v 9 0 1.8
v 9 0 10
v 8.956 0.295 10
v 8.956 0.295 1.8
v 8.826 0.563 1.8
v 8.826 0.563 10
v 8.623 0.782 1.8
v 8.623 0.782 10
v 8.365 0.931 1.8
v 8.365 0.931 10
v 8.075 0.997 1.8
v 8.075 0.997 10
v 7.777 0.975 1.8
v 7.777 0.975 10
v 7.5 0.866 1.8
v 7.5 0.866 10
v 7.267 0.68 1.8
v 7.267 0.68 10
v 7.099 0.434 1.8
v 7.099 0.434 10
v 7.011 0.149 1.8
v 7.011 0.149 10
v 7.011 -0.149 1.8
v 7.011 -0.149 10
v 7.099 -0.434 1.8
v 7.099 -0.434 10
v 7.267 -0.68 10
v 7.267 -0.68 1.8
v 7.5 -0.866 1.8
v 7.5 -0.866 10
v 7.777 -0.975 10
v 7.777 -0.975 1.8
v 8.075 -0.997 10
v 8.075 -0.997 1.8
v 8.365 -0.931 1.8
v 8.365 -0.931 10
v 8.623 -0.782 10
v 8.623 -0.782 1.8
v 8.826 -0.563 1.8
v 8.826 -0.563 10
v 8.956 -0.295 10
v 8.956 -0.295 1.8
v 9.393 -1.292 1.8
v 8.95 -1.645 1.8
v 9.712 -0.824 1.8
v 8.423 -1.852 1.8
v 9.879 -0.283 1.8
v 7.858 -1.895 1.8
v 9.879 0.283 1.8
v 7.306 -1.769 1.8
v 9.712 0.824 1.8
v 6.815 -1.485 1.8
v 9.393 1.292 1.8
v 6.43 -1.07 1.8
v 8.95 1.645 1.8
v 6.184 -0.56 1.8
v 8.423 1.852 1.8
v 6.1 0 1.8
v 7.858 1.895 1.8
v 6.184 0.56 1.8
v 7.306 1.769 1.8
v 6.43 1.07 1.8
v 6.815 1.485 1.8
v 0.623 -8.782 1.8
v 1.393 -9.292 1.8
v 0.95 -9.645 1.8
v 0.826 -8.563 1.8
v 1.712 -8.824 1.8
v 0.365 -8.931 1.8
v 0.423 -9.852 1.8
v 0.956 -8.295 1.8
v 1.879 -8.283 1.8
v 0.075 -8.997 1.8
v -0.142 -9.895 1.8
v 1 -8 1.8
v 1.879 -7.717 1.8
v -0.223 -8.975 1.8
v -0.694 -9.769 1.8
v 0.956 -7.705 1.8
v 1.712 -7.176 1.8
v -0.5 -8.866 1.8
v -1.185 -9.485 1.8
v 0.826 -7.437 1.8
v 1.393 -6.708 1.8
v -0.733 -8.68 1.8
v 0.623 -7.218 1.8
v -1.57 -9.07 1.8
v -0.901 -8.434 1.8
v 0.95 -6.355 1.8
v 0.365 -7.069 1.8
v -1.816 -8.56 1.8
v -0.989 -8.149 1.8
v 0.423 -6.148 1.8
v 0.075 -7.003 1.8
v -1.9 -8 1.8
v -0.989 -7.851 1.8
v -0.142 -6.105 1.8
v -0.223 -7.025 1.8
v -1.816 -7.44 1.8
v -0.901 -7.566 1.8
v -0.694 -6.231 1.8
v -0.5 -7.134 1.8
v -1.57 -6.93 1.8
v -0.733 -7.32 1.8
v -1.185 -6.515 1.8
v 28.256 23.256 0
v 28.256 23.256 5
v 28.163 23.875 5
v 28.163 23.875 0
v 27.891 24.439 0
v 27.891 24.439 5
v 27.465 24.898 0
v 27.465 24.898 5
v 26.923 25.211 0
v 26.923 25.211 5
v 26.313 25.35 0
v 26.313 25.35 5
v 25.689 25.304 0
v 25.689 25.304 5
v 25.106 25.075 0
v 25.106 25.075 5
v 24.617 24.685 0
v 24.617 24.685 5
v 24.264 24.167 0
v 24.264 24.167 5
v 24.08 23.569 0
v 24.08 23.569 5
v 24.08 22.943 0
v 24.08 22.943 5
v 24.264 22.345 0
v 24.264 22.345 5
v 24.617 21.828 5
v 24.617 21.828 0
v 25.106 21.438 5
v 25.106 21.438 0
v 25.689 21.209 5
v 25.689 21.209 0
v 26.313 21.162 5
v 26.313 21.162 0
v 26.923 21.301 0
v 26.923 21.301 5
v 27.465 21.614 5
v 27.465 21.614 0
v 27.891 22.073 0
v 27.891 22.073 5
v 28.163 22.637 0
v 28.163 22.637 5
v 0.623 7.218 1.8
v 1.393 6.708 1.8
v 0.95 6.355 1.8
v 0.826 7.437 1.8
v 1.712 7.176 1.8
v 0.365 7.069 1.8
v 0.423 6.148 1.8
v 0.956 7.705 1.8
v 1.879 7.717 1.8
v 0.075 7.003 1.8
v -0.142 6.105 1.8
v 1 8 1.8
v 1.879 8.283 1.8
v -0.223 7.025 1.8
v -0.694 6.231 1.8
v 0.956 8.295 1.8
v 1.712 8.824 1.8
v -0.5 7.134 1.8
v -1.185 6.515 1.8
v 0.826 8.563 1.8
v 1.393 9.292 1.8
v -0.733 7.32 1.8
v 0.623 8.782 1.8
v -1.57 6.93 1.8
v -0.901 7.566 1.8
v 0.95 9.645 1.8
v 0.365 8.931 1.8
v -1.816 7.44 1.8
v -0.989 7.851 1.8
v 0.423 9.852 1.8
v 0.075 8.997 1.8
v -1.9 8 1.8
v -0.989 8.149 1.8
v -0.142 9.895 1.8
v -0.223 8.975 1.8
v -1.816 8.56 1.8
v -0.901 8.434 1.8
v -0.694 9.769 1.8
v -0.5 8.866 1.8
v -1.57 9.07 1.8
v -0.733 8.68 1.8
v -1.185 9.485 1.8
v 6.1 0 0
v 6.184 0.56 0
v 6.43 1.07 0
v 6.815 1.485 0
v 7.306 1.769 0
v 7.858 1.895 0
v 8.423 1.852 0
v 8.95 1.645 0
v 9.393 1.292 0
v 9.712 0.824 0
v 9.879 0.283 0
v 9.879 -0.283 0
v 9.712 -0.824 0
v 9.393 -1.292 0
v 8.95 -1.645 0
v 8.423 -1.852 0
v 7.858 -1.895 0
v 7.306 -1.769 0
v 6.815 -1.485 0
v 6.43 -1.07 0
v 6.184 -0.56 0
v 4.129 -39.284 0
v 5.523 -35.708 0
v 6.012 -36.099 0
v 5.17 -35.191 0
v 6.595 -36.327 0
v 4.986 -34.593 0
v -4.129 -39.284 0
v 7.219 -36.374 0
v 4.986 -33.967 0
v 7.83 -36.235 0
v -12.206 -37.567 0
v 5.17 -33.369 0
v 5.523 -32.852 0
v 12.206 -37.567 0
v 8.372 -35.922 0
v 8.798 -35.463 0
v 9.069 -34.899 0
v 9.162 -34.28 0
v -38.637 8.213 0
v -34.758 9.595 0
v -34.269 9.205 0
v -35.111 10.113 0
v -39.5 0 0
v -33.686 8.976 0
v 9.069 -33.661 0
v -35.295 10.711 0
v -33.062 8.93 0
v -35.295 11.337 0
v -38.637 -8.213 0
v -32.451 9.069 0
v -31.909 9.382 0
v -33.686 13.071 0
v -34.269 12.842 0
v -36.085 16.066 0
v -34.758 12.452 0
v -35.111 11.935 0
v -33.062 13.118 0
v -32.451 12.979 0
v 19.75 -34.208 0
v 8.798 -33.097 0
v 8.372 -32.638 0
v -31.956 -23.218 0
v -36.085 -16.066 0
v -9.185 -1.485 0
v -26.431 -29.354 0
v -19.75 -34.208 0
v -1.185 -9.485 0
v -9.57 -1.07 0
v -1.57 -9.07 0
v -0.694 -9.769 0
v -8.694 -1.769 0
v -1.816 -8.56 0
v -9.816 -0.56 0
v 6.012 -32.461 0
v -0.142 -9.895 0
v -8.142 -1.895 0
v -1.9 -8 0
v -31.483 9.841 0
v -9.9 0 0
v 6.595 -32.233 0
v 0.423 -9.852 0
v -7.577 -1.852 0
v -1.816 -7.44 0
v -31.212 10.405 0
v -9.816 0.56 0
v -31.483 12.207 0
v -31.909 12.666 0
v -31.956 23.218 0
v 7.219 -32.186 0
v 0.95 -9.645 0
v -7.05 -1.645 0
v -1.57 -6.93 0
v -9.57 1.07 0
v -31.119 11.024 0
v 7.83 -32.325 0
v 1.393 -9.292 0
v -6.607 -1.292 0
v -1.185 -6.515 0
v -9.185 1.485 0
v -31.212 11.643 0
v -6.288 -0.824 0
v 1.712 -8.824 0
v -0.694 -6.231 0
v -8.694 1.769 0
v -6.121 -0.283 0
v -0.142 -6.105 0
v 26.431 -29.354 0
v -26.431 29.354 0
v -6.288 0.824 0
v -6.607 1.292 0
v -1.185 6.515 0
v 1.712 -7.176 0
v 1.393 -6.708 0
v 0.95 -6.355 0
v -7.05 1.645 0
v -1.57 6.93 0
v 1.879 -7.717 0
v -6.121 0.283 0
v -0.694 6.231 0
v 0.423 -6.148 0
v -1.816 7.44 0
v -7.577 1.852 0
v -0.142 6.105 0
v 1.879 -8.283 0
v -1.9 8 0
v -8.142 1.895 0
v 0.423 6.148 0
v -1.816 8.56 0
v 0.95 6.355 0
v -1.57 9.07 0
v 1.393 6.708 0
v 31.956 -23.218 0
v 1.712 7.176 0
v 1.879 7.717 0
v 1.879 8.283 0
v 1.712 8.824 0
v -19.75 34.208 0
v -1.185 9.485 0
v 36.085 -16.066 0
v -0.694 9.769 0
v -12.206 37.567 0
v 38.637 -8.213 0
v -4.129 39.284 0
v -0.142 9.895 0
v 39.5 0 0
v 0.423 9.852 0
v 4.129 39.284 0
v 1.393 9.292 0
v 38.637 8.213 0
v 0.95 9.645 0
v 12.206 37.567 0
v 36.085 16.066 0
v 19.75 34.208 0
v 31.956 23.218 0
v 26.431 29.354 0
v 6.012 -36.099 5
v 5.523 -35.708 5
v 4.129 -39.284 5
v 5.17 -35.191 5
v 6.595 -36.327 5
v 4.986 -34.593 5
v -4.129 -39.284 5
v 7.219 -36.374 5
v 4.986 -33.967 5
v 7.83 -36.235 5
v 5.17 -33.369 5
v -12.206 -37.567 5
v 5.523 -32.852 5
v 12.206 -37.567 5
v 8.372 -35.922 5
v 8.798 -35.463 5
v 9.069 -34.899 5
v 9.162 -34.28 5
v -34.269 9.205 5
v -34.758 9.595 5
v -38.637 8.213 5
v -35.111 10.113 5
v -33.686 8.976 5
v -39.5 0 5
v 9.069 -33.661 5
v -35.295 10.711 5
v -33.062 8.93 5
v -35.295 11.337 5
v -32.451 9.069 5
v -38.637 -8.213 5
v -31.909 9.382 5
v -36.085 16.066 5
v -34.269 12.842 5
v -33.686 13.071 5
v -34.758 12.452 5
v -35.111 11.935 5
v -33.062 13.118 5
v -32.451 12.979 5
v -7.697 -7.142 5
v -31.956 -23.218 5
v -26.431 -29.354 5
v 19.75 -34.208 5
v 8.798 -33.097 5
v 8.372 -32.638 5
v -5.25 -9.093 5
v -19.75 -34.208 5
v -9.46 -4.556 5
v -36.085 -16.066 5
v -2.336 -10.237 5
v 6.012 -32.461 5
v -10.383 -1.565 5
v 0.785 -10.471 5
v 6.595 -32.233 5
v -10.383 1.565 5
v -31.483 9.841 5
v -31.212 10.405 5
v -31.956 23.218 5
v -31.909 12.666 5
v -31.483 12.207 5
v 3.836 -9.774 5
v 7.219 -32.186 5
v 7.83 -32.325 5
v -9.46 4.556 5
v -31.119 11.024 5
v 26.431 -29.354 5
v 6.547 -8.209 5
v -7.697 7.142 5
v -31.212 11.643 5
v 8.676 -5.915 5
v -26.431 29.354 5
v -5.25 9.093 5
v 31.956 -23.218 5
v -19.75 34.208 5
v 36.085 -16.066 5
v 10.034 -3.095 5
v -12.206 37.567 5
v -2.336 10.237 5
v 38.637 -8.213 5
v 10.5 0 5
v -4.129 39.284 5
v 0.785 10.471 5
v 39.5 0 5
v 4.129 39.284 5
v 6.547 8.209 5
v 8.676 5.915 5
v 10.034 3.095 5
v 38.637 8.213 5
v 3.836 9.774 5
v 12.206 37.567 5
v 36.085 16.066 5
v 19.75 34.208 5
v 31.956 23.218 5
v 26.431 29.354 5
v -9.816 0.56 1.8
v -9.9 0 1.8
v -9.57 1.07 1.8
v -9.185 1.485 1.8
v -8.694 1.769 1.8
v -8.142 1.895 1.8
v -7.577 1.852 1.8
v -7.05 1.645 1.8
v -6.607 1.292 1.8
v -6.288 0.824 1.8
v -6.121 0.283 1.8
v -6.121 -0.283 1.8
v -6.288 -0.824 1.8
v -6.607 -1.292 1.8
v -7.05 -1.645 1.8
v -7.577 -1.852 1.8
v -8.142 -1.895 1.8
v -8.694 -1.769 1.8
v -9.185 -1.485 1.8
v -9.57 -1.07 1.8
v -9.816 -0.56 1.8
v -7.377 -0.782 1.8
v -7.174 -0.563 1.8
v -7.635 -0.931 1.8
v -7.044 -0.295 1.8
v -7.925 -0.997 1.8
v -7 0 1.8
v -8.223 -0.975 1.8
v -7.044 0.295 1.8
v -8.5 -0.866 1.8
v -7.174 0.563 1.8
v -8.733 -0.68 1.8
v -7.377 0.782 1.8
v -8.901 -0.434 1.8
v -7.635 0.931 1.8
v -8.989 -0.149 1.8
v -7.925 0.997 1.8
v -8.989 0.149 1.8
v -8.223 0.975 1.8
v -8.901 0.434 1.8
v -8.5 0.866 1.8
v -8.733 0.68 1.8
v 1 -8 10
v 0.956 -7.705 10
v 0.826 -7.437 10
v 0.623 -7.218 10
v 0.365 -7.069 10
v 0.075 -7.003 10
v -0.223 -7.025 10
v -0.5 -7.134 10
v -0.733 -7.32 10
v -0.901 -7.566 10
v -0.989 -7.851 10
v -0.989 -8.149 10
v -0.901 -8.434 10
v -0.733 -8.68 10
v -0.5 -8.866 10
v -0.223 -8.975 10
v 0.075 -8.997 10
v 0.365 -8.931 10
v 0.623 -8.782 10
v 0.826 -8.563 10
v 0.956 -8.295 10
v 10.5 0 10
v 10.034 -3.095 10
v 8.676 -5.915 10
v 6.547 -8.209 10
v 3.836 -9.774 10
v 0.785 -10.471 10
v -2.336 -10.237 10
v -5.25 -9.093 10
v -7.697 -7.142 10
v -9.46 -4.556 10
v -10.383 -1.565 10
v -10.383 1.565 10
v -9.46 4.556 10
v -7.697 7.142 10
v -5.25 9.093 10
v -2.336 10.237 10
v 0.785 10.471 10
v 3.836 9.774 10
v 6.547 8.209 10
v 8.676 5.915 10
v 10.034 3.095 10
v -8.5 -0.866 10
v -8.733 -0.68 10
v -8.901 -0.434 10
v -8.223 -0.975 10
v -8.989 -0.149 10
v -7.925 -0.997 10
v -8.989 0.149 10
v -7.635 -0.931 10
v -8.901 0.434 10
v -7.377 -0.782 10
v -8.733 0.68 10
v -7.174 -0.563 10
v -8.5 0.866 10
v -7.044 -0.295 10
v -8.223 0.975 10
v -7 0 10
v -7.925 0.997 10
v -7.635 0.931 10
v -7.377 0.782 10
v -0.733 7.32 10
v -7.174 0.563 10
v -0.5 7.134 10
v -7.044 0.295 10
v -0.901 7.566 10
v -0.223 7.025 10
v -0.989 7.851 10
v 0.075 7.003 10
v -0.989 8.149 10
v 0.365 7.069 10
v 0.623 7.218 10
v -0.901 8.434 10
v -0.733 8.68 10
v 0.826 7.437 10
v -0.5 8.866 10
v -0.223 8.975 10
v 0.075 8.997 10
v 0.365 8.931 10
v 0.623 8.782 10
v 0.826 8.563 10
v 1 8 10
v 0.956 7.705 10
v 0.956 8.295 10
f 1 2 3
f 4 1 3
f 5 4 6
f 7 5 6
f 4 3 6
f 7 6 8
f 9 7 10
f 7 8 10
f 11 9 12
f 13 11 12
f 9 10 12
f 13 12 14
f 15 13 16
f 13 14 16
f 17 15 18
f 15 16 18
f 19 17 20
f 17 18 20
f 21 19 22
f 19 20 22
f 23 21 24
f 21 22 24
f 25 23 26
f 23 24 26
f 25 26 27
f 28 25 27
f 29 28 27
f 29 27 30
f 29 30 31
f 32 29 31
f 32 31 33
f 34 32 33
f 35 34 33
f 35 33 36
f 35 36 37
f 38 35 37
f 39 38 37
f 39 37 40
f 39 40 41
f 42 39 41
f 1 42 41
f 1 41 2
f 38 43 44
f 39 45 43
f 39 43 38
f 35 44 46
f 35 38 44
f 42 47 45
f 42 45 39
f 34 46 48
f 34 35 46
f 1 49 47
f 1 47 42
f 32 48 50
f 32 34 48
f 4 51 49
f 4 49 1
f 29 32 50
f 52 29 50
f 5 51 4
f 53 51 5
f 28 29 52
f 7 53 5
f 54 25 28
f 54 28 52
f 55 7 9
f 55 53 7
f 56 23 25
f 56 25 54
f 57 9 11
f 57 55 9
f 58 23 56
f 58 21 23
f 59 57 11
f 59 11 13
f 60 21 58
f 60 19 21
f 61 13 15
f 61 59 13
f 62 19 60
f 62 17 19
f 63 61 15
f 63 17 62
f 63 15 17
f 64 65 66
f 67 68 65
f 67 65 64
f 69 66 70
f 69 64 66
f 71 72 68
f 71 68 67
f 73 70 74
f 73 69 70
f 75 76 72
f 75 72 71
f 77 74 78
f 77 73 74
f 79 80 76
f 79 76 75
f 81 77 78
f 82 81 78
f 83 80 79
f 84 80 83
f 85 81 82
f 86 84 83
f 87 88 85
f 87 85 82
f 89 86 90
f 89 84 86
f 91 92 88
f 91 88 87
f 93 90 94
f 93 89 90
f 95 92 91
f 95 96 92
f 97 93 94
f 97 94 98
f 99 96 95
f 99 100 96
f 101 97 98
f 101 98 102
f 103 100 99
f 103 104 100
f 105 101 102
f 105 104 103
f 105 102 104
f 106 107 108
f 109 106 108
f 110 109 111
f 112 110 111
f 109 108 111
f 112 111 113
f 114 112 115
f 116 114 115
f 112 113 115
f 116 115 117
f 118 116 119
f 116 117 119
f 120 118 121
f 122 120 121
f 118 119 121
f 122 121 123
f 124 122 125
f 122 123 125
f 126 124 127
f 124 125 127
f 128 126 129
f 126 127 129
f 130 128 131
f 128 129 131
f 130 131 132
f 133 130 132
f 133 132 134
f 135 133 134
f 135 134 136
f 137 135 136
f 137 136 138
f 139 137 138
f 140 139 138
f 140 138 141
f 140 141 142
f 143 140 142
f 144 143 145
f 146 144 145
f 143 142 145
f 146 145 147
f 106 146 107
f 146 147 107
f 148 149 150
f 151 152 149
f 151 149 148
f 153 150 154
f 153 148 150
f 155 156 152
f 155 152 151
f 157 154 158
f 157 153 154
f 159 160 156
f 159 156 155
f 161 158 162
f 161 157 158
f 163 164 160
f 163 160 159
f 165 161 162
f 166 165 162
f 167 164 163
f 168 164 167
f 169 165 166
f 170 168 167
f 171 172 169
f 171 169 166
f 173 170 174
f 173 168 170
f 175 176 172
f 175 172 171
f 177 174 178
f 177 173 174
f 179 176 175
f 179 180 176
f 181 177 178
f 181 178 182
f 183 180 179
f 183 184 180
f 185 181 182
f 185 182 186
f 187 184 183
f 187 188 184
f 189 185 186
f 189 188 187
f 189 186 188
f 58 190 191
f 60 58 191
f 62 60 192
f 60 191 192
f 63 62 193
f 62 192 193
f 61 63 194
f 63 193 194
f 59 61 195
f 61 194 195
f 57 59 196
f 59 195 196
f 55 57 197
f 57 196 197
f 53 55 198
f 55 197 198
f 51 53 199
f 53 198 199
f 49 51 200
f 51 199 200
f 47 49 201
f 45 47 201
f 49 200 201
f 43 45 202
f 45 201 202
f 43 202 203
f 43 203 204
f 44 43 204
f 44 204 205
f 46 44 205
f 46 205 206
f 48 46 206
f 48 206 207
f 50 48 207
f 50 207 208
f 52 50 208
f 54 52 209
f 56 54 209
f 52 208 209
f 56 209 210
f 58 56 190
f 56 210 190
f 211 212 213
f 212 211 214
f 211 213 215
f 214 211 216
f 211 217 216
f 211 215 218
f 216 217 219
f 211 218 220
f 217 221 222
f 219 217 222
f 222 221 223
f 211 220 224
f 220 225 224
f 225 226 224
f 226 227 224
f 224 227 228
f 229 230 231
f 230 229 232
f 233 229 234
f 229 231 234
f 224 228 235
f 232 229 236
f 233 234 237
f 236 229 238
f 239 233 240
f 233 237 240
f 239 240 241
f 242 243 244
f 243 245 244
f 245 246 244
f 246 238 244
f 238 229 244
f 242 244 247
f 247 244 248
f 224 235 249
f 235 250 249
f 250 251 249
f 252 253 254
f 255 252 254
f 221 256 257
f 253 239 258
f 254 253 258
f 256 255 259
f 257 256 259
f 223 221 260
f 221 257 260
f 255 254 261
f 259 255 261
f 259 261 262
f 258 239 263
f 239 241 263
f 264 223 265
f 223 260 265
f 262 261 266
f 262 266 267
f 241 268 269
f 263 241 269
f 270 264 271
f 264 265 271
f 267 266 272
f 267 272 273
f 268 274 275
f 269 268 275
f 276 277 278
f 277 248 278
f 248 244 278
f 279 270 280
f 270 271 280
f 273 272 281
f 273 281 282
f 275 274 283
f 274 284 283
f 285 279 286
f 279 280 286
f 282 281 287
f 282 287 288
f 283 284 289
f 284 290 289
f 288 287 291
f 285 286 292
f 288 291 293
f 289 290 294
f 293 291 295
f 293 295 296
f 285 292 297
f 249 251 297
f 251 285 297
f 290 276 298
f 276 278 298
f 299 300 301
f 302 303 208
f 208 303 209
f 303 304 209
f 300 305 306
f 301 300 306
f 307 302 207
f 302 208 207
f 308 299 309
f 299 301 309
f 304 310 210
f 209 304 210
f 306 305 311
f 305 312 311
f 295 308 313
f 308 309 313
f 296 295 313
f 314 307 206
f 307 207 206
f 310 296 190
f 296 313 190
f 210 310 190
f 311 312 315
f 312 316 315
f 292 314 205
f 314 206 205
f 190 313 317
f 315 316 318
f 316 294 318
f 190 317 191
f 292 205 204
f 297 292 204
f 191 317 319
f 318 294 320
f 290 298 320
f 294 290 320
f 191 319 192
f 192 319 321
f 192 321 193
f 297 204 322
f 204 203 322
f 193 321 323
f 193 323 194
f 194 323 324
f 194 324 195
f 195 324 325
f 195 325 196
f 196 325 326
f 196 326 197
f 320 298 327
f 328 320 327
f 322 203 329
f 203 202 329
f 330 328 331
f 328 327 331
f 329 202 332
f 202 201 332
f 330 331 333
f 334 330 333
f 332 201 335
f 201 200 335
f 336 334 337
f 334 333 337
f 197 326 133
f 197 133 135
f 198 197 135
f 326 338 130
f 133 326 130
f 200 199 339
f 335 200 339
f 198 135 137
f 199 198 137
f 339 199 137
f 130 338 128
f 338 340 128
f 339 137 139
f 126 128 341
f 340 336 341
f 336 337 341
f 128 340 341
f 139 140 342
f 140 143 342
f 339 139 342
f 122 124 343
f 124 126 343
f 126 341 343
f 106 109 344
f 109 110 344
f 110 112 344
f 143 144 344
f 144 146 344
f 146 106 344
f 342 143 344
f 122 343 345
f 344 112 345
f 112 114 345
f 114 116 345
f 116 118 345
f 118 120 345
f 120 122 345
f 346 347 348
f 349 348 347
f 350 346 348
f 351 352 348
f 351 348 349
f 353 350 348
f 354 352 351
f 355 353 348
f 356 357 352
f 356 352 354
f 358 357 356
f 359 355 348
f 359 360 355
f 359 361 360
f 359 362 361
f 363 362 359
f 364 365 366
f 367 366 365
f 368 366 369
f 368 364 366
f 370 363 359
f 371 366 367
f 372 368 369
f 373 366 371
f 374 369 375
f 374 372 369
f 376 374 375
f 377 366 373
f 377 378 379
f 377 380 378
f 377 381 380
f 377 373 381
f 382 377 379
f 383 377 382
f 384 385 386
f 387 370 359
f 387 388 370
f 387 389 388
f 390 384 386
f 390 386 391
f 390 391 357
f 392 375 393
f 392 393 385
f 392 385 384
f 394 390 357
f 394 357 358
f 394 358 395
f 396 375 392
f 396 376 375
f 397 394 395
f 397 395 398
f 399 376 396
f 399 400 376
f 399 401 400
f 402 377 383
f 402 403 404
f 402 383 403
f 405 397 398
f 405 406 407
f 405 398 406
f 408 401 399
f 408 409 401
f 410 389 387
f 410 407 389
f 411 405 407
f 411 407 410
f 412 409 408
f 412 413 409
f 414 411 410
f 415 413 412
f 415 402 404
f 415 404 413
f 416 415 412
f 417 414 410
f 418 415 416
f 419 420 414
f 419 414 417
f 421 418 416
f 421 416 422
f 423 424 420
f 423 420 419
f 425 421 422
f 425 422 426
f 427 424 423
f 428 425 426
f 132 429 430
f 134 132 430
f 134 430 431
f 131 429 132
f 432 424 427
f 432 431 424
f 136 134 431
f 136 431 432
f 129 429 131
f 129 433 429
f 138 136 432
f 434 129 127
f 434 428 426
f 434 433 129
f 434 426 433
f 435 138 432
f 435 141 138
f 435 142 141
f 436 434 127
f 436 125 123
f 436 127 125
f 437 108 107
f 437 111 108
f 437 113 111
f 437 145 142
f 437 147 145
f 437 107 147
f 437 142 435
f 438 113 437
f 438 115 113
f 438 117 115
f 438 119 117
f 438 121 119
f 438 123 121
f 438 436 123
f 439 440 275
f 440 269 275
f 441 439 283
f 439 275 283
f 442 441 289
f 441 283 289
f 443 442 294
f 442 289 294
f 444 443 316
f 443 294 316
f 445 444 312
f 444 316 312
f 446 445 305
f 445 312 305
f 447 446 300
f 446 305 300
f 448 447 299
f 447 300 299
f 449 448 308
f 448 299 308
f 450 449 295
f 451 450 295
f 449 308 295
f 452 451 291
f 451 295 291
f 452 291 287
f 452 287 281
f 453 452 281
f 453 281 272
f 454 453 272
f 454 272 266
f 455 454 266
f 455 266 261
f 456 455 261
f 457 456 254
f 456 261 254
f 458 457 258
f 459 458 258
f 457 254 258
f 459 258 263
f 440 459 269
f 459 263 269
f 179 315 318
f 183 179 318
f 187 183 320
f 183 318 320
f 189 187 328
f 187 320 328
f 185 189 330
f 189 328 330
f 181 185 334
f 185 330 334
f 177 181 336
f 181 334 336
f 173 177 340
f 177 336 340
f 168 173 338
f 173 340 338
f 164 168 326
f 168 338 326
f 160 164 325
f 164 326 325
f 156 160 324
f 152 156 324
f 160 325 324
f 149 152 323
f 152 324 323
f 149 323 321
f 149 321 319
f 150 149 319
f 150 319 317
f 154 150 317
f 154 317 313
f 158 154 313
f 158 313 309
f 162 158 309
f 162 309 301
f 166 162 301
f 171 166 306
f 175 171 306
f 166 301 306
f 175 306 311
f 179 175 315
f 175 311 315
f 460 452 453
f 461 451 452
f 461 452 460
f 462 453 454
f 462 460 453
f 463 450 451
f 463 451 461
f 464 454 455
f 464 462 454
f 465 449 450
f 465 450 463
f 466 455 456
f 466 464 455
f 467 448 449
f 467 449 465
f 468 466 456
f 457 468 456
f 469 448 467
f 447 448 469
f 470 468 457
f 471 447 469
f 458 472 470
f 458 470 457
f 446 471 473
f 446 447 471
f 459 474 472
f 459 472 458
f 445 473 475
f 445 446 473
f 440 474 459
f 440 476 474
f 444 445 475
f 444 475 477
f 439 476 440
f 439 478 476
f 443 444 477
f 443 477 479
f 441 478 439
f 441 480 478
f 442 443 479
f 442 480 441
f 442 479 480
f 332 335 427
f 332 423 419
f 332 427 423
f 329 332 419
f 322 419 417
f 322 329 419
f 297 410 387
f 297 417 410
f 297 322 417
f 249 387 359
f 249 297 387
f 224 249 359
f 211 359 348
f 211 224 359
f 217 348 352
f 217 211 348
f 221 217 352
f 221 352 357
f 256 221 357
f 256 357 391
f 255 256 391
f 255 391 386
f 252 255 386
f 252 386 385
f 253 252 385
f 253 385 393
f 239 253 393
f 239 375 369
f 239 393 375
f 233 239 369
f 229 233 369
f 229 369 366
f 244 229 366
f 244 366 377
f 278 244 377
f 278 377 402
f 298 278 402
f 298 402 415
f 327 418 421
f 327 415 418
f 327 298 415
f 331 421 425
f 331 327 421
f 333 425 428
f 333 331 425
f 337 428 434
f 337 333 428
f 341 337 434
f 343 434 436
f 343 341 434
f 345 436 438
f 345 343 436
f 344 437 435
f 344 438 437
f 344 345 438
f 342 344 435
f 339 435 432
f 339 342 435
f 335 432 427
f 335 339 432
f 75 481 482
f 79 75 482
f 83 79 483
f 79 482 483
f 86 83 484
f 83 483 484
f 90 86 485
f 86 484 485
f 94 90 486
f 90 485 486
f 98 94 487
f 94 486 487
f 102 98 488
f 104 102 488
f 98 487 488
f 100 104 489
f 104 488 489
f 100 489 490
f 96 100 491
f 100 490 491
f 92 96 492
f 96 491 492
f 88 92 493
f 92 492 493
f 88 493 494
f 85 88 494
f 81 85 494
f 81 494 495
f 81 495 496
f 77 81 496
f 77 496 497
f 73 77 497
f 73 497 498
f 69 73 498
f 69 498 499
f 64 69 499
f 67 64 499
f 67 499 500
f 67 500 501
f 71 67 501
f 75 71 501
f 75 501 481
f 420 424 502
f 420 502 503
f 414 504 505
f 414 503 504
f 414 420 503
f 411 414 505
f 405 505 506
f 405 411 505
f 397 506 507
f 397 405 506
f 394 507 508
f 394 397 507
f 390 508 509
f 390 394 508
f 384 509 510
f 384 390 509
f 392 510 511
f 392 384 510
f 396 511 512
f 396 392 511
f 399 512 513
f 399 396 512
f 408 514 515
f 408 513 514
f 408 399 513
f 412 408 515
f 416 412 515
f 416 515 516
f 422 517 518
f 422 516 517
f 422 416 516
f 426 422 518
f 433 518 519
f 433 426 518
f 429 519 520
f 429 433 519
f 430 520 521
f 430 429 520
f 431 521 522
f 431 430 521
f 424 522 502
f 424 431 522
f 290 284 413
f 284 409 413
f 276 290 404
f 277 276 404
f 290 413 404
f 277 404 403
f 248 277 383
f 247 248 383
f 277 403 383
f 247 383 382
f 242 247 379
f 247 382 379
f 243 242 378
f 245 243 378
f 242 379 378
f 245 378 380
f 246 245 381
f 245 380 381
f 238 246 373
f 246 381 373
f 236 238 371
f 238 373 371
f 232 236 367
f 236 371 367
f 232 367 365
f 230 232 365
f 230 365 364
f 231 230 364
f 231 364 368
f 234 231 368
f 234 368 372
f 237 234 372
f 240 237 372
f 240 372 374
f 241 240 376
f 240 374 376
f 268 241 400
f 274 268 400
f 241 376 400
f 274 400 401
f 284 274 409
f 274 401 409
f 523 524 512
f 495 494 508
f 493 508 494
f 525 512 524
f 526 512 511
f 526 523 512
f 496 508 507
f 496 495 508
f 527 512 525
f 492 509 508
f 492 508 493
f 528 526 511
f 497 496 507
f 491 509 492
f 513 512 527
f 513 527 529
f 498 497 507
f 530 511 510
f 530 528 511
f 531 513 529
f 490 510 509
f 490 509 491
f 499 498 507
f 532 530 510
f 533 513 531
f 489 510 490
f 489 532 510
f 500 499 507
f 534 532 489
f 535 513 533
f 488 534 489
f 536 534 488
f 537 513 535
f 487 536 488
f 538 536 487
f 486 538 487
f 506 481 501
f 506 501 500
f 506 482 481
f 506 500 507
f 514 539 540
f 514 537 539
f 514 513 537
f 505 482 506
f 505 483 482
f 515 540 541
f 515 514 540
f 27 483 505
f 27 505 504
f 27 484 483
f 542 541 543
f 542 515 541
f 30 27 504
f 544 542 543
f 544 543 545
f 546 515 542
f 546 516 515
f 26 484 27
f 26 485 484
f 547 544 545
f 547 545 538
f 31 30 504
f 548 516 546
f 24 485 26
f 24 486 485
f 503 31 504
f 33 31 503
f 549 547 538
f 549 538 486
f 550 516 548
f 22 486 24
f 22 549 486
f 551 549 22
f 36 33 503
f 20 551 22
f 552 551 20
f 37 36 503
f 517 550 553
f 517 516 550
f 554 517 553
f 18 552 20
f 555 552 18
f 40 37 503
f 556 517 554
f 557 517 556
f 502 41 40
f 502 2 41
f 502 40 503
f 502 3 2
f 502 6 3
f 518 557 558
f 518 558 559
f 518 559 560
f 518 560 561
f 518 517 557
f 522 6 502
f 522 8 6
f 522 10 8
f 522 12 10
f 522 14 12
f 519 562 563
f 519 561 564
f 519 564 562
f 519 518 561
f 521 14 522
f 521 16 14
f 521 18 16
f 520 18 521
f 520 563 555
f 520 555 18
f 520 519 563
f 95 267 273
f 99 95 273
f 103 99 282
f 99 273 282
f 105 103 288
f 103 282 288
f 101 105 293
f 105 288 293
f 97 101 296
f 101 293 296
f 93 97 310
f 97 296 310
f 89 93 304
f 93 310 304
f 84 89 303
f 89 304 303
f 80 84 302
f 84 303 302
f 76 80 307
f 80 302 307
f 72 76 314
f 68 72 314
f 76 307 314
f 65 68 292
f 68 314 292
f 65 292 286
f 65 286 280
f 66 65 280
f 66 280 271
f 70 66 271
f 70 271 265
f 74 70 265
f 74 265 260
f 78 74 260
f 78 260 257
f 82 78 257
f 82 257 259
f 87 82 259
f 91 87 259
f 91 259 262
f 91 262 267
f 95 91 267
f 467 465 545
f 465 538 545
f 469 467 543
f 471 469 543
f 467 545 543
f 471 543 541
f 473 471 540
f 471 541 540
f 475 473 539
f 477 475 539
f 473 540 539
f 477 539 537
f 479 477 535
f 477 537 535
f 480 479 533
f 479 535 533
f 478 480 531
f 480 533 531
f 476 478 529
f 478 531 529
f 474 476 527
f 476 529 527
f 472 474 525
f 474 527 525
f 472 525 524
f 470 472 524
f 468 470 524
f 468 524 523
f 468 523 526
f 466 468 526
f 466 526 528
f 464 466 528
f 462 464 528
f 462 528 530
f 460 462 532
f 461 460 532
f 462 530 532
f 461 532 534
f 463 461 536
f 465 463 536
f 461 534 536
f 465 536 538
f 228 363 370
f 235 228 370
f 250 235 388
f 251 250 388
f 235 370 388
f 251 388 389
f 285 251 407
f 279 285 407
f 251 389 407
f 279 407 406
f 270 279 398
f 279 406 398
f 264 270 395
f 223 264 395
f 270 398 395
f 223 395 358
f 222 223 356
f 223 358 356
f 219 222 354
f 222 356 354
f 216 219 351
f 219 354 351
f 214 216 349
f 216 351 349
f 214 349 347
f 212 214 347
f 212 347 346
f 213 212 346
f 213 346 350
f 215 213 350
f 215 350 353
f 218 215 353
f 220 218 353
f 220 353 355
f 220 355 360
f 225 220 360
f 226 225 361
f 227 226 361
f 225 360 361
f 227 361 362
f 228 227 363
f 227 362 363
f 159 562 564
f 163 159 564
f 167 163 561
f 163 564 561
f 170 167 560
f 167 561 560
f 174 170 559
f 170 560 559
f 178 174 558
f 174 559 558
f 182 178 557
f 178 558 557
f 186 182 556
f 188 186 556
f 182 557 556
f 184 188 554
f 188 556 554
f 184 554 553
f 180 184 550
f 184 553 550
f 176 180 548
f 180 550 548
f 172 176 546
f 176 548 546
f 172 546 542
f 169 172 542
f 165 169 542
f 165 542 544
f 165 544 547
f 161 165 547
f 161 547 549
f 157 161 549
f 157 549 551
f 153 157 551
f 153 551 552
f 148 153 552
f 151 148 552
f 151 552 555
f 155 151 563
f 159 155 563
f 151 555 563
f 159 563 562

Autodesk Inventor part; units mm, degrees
ref_plane "YZ Plane" through (0, 0, 0) normal (1, 0, 0) x (0, 1, 0)
ref_plane "XZ Plane" through (0, 0, 0) normal (0, 1, 0) x (-1, 0, 0)
ref_plane "XY Plane" through (0, 0, 0) normal (0, 0, 1) x (1, 0, 0)
sketch "スケッチ1" plane through (0, 0, 0) normal (0, 0, 1) x (1, 0, 0)
  circle A0 centre (0, 0) radius 39.5
  circle A1 centre (26.1561, 23.2563) radius 2.1
  circle A2 centre (-33.2186, 11.0237) radius 2.1
  circle A3 centre (7.0625, -34.28) radius 2.1
  dimension "d0" = 79
  dimension "d3" = 4.2
  dimension "d4" = 35
  dimension "d7" = 360
extrude "押し出し1" add sketch "スケッチ1" along normal blind 5 contours A0 | A1 | A2 | A3
sketch "スケッチ2" plane through (0, 0, 5) normal (0, 0, 1) x (1, 0, 0)
  circle A0 centre (0, 0) radius 40
  circle A1 centre (26.1561, 23.2563) radius 2.1
  circle A2 centre (-33.2186, 11.0237) radius 2.1
  circle A3 centre (7.0625, -34.28) radius 2.1
  dimension "d11" = 80
  dimension "d12" = 4.2
  dimension "d13" = 35
  dimension "d14" = 360
extrude "押し出し2" cut sketch "スケッチ2" against normal blind 5 contours A1 | A2 | A3
sketch "スケッチ3" plane through (0, 0, 5) normal (0, 0, 1) x (1, 0, 0)
  circle A0 centre (0, 0) radius 10.5
  dimension "d17" = 21
extrude "押し出し3" add sketch "スケッチ3" along normal blind 5
sketch "スケッチ4" plane through (0, 0, 10) normal (0, 0, 1) x (1, 0, 0)
  circle A0 centre (0, 8) radius 1
  line L0 (0, -55.3) -> (0, 55.3) projected
  circle A1 centre (-8, 0) radius 1
  circle A2 centre (0, -8) radius 1
  circle A3 centre (8, 0) radius 1
  point P0 (0, 0)
  dimension "d20" = 2
  dimension "d21" = 8
  dimension "d24" = 360
extrude "押し出し4" cut sketch "スケッチ4" against normal blind 10
sketch "スケッチ5" plane through (0, 0, 0) normal (0, 0, -1) x (-1, 0, 0)
  circle A0 centre (-8, 0) radius 1 projected
  circle A1 centre (-8, 0) radius 1.9
  circle A2 centre (0, -8) radius 1.9
  circle A3 centre (8, 0) radius 1.9
  circle A4 centre (0, 8) radius 1.9
  point P0 (0, 0)
  dimension "d28" = 3.8
  dimension "d31" = 360
extrude "押し出し5" cut sketch "スケッチ5" against normal blind 1.8
properties part number "rotate_plate_4"
